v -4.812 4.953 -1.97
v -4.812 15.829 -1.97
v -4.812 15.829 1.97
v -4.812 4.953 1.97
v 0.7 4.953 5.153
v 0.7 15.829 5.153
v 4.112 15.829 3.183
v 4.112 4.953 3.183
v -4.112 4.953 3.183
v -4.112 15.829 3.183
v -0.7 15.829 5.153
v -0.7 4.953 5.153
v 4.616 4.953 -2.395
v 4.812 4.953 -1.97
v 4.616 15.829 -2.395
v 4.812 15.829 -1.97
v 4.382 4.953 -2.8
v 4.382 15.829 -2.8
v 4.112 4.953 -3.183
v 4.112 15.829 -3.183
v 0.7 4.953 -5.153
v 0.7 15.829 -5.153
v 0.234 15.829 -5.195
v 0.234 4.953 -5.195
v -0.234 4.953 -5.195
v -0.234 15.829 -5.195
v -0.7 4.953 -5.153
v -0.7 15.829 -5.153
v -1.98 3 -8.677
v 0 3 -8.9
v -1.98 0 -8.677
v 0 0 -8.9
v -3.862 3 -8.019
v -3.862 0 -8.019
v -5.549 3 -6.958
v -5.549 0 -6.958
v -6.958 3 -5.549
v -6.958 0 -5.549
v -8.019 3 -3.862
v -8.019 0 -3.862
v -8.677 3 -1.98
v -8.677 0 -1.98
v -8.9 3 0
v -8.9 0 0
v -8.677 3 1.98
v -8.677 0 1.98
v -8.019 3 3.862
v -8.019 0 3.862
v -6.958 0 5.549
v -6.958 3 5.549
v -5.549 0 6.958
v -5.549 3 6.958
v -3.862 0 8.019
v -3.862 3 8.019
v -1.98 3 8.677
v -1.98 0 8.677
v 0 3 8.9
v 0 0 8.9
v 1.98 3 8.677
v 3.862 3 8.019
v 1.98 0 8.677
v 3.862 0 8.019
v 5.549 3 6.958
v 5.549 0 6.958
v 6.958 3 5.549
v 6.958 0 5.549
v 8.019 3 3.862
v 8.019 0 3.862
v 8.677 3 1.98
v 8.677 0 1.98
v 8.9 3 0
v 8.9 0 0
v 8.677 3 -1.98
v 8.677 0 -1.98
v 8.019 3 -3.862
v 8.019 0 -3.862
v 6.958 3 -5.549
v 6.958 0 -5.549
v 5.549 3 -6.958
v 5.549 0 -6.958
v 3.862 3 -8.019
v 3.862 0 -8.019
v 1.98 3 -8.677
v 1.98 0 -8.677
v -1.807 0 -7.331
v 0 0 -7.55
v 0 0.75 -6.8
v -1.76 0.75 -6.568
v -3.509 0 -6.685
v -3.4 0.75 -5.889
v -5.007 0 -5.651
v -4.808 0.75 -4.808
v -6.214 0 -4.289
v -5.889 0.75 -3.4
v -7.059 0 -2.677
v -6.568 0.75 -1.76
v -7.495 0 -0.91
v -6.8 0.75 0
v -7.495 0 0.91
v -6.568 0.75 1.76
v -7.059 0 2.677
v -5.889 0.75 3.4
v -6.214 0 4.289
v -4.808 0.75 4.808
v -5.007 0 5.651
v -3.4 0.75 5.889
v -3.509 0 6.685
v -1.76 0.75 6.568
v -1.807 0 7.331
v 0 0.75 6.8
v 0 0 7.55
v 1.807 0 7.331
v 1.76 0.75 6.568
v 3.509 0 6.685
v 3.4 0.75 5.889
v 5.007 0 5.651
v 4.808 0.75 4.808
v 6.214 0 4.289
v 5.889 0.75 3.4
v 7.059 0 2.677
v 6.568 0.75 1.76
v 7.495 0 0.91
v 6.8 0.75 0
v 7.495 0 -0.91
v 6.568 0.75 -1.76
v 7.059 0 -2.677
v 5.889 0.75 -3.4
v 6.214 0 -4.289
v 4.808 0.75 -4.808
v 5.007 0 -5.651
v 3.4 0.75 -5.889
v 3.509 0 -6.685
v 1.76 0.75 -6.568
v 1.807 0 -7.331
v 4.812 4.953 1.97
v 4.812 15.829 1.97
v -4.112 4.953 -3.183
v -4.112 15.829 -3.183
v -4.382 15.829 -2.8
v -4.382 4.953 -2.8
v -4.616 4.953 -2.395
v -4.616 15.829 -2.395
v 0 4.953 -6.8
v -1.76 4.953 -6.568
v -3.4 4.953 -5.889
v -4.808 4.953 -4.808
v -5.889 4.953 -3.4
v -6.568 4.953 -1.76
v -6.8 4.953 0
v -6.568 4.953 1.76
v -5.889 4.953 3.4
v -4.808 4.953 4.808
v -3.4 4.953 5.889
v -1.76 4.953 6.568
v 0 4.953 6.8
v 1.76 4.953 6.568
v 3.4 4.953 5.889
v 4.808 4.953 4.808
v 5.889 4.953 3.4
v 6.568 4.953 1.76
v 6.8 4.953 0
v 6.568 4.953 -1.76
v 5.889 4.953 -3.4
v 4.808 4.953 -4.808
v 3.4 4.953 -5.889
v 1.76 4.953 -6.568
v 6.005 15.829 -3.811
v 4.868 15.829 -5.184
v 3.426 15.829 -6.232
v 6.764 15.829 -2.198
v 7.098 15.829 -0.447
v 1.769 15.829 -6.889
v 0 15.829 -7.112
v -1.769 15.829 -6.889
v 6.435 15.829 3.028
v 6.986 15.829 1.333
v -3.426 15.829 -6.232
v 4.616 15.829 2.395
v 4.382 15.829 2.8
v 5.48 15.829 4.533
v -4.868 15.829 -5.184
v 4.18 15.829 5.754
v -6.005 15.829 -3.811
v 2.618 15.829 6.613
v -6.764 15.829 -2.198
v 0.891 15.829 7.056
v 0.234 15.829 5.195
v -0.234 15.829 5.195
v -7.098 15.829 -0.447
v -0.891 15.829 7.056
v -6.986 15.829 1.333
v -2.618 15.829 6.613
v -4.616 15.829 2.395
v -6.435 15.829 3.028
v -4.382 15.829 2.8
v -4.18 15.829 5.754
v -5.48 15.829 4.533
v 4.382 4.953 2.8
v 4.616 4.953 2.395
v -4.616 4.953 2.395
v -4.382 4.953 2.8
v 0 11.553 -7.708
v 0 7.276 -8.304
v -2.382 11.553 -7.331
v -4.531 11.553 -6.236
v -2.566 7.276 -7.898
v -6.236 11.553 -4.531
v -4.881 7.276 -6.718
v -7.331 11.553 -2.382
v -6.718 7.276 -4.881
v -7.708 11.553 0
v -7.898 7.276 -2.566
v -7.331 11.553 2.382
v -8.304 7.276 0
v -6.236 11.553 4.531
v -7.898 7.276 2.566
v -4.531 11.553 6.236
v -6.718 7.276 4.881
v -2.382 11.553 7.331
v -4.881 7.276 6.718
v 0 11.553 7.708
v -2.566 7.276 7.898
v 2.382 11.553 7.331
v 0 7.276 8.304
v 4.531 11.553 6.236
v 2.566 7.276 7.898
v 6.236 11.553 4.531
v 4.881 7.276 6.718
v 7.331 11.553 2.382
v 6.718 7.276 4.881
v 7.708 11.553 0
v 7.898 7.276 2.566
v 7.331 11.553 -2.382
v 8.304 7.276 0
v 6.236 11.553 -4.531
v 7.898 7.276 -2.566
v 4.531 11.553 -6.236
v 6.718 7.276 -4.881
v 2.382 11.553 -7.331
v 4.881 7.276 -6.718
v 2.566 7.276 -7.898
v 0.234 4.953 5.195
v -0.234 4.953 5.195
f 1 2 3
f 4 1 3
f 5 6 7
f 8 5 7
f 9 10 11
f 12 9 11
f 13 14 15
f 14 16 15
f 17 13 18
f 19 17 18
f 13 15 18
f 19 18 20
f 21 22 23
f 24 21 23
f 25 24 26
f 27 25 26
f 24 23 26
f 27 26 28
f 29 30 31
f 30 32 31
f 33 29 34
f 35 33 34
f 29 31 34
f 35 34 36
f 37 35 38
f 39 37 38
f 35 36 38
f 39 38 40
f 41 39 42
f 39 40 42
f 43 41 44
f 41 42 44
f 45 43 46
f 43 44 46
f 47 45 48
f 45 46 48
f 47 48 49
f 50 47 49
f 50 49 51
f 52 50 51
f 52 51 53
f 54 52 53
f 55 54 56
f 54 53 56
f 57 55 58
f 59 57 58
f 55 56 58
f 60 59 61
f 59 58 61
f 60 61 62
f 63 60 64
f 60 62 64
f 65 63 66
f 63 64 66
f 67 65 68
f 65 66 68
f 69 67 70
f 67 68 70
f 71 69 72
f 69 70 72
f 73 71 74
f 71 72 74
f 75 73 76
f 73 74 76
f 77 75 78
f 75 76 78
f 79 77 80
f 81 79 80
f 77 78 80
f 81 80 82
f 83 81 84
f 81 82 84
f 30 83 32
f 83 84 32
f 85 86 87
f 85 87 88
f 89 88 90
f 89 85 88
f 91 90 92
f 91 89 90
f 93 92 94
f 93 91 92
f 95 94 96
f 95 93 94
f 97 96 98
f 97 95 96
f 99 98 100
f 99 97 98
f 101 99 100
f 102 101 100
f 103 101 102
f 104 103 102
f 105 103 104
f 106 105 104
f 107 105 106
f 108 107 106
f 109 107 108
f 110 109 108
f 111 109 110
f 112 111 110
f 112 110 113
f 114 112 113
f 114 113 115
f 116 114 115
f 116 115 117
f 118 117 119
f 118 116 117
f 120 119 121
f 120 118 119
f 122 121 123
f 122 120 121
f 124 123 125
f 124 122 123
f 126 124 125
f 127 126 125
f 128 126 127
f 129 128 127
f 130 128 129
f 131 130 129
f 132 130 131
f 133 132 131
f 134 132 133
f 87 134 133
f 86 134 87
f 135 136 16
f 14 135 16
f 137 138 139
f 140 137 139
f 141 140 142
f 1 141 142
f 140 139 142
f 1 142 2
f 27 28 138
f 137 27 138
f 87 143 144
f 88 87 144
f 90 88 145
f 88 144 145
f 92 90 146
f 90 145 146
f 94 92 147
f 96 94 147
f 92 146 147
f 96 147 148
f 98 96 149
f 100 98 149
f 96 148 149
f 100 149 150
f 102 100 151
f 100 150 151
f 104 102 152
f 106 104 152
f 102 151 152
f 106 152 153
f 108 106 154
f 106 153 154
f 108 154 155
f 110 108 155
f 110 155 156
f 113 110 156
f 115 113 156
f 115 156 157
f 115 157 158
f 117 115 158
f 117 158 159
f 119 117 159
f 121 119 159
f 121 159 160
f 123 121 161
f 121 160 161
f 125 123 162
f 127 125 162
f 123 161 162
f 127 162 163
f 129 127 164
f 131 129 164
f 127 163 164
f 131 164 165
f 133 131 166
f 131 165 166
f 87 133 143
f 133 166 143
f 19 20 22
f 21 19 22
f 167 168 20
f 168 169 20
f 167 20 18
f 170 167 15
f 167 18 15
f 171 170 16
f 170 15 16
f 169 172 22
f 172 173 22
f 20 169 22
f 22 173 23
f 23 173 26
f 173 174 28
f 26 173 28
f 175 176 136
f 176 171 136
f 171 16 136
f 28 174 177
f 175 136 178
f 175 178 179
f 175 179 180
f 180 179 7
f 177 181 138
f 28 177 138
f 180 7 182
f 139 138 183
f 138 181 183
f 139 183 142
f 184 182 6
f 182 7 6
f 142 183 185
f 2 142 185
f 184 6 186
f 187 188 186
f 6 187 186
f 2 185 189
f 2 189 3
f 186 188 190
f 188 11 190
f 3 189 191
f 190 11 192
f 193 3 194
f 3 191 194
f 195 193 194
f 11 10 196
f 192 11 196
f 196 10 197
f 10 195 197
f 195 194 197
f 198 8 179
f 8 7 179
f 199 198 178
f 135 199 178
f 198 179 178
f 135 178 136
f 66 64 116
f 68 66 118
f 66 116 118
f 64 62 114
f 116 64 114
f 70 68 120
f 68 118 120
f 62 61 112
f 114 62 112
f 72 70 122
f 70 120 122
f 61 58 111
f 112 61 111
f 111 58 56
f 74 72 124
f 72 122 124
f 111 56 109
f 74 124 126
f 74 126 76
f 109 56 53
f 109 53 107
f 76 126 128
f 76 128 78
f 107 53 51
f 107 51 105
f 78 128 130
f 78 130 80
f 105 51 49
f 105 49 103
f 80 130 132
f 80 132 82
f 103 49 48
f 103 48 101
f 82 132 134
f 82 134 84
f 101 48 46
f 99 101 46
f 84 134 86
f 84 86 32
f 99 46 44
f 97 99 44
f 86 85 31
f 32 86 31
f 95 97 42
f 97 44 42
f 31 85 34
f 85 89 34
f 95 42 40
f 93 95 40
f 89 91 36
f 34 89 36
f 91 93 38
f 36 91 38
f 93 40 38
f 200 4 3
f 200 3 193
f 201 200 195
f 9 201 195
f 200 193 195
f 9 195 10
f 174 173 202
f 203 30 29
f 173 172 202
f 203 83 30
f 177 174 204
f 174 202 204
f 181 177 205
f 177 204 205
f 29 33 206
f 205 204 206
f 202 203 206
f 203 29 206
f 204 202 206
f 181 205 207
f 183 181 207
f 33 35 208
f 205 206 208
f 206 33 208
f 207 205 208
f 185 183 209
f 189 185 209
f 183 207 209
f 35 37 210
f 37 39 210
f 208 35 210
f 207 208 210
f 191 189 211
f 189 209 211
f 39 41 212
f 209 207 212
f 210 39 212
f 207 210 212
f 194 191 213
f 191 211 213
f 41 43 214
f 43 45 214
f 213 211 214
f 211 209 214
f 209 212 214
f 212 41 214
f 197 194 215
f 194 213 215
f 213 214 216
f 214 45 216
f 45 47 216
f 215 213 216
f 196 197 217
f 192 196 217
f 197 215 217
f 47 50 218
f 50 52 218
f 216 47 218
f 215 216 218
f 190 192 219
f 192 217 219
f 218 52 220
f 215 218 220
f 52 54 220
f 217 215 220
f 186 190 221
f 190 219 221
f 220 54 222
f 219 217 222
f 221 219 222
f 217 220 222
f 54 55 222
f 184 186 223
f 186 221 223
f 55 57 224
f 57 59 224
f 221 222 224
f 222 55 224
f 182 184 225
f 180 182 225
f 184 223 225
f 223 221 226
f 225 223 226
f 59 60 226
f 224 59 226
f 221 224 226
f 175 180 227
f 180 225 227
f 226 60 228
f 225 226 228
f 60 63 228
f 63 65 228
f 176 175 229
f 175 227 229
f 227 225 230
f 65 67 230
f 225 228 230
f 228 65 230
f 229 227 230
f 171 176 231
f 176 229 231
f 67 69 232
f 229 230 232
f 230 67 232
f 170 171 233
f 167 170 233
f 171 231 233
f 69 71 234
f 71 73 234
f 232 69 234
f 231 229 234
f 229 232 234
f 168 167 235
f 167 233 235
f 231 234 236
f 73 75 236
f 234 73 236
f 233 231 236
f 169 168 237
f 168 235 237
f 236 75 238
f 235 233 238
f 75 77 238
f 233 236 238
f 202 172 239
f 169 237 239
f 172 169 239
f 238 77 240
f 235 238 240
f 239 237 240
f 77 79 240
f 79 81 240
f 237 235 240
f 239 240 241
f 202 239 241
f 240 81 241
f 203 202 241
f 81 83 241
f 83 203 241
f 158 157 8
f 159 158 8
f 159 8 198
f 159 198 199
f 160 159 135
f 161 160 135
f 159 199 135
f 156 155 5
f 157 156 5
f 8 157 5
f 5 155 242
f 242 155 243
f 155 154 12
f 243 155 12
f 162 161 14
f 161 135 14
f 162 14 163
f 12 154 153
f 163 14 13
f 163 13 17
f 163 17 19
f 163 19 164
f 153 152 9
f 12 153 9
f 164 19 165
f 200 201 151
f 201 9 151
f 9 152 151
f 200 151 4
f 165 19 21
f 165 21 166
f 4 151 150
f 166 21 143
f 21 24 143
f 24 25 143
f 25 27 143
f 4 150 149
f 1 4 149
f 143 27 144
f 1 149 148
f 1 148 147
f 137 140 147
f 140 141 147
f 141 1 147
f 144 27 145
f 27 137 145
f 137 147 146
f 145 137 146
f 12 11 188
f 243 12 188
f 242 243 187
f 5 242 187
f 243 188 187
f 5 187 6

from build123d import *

# Parameters (mm, degrees)
BOSS_EXTRUDE1_START = -10.876
BOSS_EXTRUDE1_DEPTH = 10.876
CHAMFER1_SIZE       = 0.75


with BuildPart() as part:
    # Sketch1 → Revolve1 (revolve)
    with BuildSketch(Plane.XY, mode=Mode.PRIVATE) as revolve1_sk:
        Polygon((6.8, 0), (6.8, 4.953), (5.2, 4.953), (5.2, 15.829), (7.112, 15.829), (8.9, 3), (8.9, 0), align=None)
    revolve(revolve1_sk.sketch.rotate(Axis((0, 0, 0), (0, 1, 0)), 90), axis=Axis((0, 0, 0), (0, 1, 0)))

    # Sketch4 → Boss-Extrude1 (add)
    with BuildSketch(Plane.XZ.offset(-4.953).offset(BOSS_EXTRUDE1_START)):
        with BuildLine():
            Line((0.700412138, 5.152613205), (4.112087862, 3.182881307))
            ThreePointArc((4.112087862, 3.182881307), (2.6, 4.5033321), (0.700412138, 5.152613205))
        make_face()
        with BuildLine():
            ThreePointArc((4.8125, -1.969731898), (5.2, 0), (4.8125, 1.969731898))
            Line((4.8125, 1.969731898), (4.8125, -1.969731898))
        make_face()
        with BuildLine():
            Line((-4.112087862, 3.182881307), (-0.700412138, 5.152613205))
            ThreePointArc((-0.700412138, 5.152613205), (-2.6, 4.5033321), (-4.112087862, 3.182881307))
        make_face()
        with BuildLine():
            ThreePointArc((0.700412138, -5.152613205), (2.6, -4.5033321), (4.112087862, -3.182881307))
            Line((4.112087862, -3.182881307), (0.700412138, -5.152613205))
        make_face()
        with BuildLine():
            Line((-4.8125, -1.969731898), (-4.8125, 1.969731898))
            ThreePointArc((-4.8125, 1.969731898), (-5.2, 0), (-4.8125, -1.969731898))
        make_face()
        with BuildLine():
            ThreePointArc((-4.112087862, -3.182881307), (-2.6, -4.5033321), (-0.700412138, -5.152613205))
            Line((-0.700412138, -5.152613205), (-4.112087862, -3.182881307))
        make_face()
    extrude(amount=BOSS_EXTRUDE1_DEPTH)

    # Chamfer1
    chamfer1_edges = [part.edges().sort_by_distance(p)[0] for p in [
        (0, 0, 6.8),
    ]]
    chamfer(chamfer1_edges, length=CHAMFER1_SIZE)


solid = part.part
